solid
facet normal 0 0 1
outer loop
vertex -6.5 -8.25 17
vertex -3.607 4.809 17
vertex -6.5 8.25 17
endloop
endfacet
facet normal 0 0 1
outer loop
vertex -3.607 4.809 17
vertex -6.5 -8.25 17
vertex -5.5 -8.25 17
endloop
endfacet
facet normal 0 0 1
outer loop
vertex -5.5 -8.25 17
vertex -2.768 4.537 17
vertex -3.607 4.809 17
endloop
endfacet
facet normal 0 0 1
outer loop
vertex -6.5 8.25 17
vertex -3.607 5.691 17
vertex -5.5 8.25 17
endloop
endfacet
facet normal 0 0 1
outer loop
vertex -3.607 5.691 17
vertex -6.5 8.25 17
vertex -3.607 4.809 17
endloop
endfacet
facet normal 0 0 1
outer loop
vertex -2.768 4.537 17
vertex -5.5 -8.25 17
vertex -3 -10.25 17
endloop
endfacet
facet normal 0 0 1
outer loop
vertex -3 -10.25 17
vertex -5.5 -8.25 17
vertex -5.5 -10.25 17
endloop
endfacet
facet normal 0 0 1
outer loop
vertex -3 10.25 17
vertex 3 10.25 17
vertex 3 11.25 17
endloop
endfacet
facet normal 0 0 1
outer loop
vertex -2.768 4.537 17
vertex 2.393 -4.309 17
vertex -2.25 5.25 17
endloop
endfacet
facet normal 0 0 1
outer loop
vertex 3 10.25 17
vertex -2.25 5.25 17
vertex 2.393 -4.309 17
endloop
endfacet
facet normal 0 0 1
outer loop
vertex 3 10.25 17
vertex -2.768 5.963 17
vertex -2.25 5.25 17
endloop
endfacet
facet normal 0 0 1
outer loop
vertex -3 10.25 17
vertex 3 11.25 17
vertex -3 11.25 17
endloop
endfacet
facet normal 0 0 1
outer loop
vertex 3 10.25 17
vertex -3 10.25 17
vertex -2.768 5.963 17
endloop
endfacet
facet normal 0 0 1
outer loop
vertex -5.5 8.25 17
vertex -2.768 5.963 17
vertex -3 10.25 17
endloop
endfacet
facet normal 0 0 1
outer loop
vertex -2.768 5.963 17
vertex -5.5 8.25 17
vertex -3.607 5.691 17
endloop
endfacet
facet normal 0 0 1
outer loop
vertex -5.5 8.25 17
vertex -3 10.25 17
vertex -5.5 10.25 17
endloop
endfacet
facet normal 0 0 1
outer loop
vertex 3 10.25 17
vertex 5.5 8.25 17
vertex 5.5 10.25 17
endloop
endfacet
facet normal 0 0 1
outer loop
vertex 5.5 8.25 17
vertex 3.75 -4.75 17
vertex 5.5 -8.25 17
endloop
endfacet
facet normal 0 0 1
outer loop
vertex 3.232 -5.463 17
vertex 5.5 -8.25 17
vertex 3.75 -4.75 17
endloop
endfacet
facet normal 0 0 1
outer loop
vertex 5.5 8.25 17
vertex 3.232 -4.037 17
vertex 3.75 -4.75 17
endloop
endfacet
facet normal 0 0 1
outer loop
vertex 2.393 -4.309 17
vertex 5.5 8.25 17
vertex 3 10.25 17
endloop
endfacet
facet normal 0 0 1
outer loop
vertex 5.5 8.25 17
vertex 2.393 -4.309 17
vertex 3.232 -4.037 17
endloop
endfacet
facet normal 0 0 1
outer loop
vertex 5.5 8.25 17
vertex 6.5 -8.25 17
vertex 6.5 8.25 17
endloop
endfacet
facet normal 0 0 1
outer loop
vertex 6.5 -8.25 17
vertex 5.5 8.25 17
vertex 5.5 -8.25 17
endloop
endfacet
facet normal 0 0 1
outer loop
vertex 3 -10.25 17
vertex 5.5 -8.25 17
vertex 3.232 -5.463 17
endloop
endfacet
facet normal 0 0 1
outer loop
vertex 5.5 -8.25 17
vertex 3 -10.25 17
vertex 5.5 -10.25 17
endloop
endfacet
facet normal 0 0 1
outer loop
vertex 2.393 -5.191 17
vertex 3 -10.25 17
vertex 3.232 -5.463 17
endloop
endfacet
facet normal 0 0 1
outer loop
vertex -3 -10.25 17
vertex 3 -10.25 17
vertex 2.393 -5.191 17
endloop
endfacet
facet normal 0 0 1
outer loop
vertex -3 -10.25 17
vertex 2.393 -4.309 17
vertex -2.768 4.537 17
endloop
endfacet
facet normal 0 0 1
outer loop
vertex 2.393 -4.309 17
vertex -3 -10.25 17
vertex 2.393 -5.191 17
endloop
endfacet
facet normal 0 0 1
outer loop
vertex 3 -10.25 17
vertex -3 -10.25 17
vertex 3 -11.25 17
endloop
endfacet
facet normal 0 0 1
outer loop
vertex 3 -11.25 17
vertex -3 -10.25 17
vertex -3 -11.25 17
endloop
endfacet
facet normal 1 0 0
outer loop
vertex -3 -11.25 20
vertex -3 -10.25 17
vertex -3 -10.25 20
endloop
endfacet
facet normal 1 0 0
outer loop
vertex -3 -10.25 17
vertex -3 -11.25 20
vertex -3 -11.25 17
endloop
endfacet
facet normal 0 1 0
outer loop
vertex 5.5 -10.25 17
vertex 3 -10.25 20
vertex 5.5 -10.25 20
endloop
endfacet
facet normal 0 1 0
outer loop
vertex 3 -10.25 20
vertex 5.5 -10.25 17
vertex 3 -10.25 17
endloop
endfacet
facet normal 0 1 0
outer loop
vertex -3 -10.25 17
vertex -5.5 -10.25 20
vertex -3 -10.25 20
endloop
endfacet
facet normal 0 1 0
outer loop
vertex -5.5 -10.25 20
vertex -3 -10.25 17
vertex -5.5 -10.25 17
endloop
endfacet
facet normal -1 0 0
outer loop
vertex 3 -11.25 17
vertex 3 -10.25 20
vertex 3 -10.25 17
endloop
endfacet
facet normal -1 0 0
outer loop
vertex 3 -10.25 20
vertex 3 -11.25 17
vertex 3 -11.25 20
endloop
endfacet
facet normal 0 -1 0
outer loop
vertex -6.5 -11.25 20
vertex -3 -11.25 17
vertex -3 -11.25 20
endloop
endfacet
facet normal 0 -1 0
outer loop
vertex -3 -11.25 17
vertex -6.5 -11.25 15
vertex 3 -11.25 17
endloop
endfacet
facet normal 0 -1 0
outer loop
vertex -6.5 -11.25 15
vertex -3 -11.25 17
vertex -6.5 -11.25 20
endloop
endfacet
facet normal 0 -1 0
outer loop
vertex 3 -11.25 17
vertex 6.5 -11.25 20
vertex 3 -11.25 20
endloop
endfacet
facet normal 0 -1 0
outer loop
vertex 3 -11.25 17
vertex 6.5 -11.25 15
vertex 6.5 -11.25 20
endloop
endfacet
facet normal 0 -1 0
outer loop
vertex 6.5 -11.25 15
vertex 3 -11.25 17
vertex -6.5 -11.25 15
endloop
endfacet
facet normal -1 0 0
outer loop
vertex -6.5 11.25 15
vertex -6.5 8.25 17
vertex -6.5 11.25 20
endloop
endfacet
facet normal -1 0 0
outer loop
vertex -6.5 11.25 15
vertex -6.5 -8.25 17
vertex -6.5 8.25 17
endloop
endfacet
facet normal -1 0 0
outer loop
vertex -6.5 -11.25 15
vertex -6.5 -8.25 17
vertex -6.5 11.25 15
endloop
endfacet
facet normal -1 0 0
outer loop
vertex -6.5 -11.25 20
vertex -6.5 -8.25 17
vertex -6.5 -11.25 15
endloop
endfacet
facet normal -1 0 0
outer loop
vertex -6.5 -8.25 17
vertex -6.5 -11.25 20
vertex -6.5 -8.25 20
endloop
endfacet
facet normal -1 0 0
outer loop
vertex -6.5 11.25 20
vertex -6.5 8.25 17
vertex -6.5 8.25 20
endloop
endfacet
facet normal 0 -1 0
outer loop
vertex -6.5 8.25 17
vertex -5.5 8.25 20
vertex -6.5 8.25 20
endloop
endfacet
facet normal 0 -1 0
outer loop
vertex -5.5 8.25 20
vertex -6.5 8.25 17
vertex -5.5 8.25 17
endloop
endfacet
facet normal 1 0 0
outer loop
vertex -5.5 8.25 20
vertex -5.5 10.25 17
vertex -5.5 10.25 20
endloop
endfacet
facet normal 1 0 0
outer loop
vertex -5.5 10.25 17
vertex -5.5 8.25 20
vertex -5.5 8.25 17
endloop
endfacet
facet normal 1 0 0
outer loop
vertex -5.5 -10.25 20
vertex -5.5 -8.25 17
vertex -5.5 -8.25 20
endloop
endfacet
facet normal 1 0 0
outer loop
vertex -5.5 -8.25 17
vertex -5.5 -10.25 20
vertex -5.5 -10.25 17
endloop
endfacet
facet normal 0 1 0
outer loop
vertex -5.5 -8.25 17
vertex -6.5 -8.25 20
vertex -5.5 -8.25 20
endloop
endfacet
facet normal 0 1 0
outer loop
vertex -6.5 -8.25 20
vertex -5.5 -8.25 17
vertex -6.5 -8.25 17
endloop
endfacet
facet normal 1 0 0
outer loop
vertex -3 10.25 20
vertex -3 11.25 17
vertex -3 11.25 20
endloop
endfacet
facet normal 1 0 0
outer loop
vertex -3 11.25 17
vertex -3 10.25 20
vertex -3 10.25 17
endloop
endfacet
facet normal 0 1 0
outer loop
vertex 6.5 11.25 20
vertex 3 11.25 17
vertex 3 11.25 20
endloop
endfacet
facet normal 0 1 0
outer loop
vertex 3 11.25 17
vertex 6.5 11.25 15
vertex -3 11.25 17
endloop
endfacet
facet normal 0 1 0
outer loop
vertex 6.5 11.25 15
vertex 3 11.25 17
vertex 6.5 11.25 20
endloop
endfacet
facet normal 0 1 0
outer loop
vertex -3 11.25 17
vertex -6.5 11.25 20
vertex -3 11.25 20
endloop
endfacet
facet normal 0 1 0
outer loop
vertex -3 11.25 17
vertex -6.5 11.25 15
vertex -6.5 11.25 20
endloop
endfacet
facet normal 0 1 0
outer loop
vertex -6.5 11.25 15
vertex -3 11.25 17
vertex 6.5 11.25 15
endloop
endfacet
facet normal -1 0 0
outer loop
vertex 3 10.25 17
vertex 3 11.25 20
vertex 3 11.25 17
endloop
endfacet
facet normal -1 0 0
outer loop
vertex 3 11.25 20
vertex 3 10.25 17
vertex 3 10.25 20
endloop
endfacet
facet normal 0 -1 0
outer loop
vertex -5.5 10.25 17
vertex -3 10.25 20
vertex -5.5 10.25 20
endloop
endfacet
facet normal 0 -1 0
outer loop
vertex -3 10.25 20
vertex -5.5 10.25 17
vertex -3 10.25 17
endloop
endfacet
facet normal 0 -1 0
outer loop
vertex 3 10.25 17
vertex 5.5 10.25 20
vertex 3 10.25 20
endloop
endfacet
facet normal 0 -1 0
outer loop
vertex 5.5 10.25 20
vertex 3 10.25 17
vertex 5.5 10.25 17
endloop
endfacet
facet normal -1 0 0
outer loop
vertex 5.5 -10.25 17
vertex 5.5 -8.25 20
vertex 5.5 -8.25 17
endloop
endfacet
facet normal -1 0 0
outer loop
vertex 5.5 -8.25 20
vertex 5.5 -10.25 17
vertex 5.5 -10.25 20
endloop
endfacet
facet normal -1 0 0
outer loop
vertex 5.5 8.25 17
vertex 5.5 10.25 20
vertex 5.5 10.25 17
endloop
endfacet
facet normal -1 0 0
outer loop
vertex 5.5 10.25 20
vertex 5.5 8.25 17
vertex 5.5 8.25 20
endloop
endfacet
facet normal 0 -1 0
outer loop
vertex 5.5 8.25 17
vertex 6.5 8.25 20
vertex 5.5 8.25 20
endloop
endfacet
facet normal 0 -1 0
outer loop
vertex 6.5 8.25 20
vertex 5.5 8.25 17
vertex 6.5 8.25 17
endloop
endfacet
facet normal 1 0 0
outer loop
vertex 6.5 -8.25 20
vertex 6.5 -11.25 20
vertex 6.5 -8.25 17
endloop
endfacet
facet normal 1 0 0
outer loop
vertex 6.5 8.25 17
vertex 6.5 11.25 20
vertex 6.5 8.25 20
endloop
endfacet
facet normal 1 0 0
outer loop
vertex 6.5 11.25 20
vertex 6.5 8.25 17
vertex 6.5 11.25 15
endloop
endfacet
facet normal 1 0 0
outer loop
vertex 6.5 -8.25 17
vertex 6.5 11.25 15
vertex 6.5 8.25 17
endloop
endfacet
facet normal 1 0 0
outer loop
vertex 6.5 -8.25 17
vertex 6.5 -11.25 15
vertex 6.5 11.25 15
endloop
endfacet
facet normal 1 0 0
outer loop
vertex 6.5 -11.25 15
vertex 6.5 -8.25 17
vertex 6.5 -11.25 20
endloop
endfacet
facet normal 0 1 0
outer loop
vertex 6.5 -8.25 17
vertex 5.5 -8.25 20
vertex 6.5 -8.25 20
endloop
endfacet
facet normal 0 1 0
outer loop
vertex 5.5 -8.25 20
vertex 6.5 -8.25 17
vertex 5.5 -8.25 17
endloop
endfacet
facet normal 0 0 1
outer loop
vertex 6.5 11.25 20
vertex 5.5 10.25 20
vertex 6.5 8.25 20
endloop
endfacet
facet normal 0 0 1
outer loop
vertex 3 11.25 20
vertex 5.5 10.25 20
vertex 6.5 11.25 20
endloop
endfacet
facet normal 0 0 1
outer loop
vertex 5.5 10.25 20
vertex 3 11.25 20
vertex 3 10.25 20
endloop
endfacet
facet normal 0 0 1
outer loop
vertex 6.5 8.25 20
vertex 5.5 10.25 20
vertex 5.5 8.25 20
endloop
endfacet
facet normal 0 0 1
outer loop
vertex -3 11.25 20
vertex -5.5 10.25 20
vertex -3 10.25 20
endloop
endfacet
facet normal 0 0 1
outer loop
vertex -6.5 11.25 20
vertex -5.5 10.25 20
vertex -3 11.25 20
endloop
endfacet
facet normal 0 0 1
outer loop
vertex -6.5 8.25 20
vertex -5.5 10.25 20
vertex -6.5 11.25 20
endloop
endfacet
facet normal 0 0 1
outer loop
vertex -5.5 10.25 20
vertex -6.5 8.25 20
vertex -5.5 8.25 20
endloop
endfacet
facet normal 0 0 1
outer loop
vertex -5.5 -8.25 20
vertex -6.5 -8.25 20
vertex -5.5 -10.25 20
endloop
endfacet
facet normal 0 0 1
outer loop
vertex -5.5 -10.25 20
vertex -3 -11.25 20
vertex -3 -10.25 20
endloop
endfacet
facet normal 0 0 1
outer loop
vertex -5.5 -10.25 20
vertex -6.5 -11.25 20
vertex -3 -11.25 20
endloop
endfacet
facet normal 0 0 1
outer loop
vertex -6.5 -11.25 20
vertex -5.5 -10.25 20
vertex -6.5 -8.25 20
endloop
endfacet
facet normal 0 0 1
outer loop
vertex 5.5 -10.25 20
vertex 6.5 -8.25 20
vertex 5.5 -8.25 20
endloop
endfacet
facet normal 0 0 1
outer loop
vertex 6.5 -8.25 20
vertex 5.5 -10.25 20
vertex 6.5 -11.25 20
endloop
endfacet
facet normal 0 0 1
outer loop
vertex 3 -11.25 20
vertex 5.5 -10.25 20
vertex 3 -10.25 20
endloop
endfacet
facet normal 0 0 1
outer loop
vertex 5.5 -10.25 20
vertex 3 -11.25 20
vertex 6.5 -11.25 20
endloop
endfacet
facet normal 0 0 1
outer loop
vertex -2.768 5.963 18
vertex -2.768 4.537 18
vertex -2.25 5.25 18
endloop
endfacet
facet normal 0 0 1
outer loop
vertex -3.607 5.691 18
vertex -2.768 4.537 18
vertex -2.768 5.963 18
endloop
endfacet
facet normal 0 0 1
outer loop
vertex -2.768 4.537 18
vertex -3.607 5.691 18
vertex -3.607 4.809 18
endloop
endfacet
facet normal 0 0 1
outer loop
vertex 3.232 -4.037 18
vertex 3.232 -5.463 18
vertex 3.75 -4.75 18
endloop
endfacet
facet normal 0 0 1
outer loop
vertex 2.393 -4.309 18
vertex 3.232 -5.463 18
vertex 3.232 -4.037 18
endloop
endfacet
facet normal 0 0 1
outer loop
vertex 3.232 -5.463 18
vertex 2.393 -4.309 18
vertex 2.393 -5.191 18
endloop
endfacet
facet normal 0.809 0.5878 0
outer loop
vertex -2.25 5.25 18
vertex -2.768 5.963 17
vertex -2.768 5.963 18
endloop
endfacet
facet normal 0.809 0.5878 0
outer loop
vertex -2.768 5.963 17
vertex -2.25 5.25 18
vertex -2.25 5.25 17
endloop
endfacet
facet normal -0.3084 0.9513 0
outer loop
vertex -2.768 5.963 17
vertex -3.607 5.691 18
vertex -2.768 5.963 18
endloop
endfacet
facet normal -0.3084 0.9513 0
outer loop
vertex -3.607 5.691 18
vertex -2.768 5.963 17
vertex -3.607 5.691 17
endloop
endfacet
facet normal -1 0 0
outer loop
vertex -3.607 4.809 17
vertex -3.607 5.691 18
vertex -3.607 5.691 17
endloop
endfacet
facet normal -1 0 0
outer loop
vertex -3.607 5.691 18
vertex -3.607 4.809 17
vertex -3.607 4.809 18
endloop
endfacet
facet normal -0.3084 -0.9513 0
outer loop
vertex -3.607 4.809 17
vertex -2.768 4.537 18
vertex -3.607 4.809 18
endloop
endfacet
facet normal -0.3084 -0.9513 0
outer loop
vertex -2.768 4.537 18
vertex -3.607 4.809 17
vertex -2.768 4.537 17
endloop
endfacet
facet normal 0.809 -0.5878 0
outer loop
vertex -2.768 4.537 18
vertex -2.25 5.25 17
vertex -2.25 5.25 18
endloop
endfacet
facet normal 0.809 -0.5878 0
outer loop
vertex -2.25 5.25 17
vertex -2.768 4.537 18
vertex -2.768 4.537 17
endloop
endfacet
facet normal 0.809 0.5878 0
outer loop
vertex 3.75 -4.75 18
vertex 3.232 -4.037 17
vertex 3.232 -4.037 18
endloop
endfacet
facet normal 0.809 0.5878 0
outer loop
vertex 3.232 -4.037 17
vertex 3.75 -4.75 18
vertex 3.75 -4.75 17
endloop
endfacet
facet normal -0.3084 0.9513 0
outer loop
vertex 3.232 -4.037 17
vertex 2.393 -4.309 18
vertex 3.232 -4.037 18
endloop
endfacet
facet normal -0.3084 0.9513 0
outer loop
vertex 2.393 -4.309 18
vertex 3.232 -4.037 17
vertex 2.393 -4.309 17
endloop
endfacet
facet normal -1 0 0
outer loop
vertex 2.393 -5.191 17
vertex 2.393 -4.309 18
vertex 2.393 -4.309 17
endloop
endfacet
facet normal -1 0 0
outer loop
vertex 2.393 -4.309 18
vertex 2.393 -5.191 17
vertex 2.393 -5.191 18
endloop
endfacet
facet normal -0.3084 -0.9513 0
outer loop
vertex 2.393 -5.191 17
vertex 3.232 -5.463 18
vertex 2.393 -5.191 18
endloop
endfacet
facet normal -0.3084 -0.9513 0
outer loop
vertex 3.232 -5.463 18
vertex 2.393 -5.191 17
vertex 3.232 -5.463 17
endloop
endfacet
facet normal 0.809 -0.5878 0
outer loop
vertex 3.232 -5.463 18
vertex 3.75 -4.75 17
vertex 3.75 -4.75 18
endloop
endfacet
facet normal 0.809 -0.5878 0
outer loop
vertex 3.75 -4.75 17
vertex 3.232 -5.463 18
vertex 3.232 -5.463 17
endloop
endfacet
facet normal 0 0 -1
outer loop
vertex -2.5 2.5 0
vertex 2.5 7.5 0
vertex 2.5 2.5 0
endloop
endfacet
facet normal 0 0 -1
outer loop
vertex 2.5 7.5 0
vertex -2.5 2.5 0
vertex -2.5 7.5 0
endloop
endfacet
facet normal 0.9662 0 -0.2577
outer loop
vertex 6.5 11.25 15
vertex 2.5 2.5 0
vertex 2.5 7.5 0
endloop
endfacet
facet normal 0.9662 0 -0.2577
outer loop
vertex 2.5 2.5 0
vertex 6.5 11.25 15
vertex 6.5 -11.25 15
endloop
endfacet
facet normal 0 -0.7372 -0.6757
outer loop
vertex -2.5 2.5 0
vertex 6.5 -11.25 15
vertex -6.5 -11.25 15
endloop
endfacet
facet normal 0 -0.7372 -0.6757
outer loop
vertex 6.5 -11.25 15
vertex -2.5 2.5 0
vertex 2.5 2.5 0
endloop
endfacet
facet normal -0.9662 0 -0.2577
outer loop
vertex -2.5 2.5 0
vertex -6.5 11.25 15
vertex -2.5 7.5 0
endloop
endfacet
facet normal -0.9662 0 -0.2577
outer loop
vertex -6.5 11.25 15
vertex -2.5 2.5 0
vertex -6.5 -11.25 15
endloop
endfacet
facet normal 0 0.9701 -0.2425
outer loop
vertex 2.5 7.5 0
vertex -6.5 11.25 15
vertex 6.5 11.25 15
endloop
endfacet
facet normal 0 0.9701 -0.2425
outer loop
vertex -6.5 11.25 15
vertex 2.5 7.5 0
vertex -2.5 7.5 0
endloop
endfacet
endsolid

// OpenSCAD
// file: solenoid-mount.scad
module SolenoidMount() {
  x_padding = 0;
  y_padding = 0;
  bottom_padding = 2;

  solenoid_z = 12;
  solenoid_x = 11 + (2 * x_padding);
  solenoid_y = 20.5 + (2 * y_padding);

  wall_thickness = 1;

  case_z = solenoid_z;
  case_x = solenoid_x + (wall_thickness * 2);
  case_y = solenoid_y + (wall_thickness * 2);

  shaft_width_front = 3;
  shaft_width_back = 6;
  corner_height = 3;

  union() {
    difference() {
      linear_extrude(corner_height + bottom_padding)
        square(size = [case_x, case_y], center = true);

      // Solenoid cutout
      translate([0, 0, bottom_padding])
        linear_extrude(solenoid_z)
        square(size = [solenoid_x, solenoid_y], center = true);

      for(i = [-1, 1]) {
        translate([0, i *((solenoid_y / 2) + (wall_thickness / 2)), bottom_padding])
          linear_extrude(solenoid_z)
          square(size = [shaft_width_back, wall_thickness], center = true);

        translate([i *((solenoid_x / 2) + (wall_thickness / 2)), 0, bottom_padding])
          linear_extrude(solenoid_z)
          square(size = [wall_thickness, solenoid_y - 4], center = true);
      }
    }

    translate([0, 0, bottom_padding])
      linear_extrude(1) {
        front = solenoid_y / 2;
        translate([-3, front - 5, 0])
          circle(d = 1.5);

        translate([3, front - 5 - 10, 0])
          circle(d = 1.5);
      }
  }
}

SolenoidMount();
// main file
module SolenoidStand(z, bottom_shift, ridge_thickness) {
  solenoid_x = 11;
  solenoid_y = 20.5;
  wall_thickness = 1;

  // These are from the solenoid mount file
  top_x = solenoid_x + (wall_thickness * 2);
  top_y = solenoid_y + (wall_thickness * 2);

  bottom_x = ridge_thickness;
  bottom_y = ridge_thickness;

  function center_square_points(x, y, z) = [
    [-(x / 2), -(y / 2), z],
    [(x / 2),  -(y / 2), z],
    [(x / 2),   (y / 2), z],
    [-(x / 2),  (y / 2), z],
  ];

    function translate_points(list, x, y) = [for (elm = list) [elm[0] + x, elm[1] + y, elm[2]] ];

    solenoid_mounting_z = z;

    TrapezoidPoints = concat(
        translate_points(center_square_points(bottom_x, bottom_y, 0), 0, bottom_shift), // bottom square
        center_square_points(top_x, top_y, solenoid_mounting_z));

    CubeFaces = [
      [0,1,2,3],  // bottom
      [4,5,1,0],  // front
      [7,6,5,4],  // top
      [5,6,2,1],  // right
      [6,7,3,2],  // back
      [7,4,0,3]]; // left

    polyhedron(TrapezoidPoints, CubeFaces);
}

use <solenoid-mount.scad>

translate([0, 0, 15])
SolenoidMount();
SolenoidStand(15, 5, 5);
